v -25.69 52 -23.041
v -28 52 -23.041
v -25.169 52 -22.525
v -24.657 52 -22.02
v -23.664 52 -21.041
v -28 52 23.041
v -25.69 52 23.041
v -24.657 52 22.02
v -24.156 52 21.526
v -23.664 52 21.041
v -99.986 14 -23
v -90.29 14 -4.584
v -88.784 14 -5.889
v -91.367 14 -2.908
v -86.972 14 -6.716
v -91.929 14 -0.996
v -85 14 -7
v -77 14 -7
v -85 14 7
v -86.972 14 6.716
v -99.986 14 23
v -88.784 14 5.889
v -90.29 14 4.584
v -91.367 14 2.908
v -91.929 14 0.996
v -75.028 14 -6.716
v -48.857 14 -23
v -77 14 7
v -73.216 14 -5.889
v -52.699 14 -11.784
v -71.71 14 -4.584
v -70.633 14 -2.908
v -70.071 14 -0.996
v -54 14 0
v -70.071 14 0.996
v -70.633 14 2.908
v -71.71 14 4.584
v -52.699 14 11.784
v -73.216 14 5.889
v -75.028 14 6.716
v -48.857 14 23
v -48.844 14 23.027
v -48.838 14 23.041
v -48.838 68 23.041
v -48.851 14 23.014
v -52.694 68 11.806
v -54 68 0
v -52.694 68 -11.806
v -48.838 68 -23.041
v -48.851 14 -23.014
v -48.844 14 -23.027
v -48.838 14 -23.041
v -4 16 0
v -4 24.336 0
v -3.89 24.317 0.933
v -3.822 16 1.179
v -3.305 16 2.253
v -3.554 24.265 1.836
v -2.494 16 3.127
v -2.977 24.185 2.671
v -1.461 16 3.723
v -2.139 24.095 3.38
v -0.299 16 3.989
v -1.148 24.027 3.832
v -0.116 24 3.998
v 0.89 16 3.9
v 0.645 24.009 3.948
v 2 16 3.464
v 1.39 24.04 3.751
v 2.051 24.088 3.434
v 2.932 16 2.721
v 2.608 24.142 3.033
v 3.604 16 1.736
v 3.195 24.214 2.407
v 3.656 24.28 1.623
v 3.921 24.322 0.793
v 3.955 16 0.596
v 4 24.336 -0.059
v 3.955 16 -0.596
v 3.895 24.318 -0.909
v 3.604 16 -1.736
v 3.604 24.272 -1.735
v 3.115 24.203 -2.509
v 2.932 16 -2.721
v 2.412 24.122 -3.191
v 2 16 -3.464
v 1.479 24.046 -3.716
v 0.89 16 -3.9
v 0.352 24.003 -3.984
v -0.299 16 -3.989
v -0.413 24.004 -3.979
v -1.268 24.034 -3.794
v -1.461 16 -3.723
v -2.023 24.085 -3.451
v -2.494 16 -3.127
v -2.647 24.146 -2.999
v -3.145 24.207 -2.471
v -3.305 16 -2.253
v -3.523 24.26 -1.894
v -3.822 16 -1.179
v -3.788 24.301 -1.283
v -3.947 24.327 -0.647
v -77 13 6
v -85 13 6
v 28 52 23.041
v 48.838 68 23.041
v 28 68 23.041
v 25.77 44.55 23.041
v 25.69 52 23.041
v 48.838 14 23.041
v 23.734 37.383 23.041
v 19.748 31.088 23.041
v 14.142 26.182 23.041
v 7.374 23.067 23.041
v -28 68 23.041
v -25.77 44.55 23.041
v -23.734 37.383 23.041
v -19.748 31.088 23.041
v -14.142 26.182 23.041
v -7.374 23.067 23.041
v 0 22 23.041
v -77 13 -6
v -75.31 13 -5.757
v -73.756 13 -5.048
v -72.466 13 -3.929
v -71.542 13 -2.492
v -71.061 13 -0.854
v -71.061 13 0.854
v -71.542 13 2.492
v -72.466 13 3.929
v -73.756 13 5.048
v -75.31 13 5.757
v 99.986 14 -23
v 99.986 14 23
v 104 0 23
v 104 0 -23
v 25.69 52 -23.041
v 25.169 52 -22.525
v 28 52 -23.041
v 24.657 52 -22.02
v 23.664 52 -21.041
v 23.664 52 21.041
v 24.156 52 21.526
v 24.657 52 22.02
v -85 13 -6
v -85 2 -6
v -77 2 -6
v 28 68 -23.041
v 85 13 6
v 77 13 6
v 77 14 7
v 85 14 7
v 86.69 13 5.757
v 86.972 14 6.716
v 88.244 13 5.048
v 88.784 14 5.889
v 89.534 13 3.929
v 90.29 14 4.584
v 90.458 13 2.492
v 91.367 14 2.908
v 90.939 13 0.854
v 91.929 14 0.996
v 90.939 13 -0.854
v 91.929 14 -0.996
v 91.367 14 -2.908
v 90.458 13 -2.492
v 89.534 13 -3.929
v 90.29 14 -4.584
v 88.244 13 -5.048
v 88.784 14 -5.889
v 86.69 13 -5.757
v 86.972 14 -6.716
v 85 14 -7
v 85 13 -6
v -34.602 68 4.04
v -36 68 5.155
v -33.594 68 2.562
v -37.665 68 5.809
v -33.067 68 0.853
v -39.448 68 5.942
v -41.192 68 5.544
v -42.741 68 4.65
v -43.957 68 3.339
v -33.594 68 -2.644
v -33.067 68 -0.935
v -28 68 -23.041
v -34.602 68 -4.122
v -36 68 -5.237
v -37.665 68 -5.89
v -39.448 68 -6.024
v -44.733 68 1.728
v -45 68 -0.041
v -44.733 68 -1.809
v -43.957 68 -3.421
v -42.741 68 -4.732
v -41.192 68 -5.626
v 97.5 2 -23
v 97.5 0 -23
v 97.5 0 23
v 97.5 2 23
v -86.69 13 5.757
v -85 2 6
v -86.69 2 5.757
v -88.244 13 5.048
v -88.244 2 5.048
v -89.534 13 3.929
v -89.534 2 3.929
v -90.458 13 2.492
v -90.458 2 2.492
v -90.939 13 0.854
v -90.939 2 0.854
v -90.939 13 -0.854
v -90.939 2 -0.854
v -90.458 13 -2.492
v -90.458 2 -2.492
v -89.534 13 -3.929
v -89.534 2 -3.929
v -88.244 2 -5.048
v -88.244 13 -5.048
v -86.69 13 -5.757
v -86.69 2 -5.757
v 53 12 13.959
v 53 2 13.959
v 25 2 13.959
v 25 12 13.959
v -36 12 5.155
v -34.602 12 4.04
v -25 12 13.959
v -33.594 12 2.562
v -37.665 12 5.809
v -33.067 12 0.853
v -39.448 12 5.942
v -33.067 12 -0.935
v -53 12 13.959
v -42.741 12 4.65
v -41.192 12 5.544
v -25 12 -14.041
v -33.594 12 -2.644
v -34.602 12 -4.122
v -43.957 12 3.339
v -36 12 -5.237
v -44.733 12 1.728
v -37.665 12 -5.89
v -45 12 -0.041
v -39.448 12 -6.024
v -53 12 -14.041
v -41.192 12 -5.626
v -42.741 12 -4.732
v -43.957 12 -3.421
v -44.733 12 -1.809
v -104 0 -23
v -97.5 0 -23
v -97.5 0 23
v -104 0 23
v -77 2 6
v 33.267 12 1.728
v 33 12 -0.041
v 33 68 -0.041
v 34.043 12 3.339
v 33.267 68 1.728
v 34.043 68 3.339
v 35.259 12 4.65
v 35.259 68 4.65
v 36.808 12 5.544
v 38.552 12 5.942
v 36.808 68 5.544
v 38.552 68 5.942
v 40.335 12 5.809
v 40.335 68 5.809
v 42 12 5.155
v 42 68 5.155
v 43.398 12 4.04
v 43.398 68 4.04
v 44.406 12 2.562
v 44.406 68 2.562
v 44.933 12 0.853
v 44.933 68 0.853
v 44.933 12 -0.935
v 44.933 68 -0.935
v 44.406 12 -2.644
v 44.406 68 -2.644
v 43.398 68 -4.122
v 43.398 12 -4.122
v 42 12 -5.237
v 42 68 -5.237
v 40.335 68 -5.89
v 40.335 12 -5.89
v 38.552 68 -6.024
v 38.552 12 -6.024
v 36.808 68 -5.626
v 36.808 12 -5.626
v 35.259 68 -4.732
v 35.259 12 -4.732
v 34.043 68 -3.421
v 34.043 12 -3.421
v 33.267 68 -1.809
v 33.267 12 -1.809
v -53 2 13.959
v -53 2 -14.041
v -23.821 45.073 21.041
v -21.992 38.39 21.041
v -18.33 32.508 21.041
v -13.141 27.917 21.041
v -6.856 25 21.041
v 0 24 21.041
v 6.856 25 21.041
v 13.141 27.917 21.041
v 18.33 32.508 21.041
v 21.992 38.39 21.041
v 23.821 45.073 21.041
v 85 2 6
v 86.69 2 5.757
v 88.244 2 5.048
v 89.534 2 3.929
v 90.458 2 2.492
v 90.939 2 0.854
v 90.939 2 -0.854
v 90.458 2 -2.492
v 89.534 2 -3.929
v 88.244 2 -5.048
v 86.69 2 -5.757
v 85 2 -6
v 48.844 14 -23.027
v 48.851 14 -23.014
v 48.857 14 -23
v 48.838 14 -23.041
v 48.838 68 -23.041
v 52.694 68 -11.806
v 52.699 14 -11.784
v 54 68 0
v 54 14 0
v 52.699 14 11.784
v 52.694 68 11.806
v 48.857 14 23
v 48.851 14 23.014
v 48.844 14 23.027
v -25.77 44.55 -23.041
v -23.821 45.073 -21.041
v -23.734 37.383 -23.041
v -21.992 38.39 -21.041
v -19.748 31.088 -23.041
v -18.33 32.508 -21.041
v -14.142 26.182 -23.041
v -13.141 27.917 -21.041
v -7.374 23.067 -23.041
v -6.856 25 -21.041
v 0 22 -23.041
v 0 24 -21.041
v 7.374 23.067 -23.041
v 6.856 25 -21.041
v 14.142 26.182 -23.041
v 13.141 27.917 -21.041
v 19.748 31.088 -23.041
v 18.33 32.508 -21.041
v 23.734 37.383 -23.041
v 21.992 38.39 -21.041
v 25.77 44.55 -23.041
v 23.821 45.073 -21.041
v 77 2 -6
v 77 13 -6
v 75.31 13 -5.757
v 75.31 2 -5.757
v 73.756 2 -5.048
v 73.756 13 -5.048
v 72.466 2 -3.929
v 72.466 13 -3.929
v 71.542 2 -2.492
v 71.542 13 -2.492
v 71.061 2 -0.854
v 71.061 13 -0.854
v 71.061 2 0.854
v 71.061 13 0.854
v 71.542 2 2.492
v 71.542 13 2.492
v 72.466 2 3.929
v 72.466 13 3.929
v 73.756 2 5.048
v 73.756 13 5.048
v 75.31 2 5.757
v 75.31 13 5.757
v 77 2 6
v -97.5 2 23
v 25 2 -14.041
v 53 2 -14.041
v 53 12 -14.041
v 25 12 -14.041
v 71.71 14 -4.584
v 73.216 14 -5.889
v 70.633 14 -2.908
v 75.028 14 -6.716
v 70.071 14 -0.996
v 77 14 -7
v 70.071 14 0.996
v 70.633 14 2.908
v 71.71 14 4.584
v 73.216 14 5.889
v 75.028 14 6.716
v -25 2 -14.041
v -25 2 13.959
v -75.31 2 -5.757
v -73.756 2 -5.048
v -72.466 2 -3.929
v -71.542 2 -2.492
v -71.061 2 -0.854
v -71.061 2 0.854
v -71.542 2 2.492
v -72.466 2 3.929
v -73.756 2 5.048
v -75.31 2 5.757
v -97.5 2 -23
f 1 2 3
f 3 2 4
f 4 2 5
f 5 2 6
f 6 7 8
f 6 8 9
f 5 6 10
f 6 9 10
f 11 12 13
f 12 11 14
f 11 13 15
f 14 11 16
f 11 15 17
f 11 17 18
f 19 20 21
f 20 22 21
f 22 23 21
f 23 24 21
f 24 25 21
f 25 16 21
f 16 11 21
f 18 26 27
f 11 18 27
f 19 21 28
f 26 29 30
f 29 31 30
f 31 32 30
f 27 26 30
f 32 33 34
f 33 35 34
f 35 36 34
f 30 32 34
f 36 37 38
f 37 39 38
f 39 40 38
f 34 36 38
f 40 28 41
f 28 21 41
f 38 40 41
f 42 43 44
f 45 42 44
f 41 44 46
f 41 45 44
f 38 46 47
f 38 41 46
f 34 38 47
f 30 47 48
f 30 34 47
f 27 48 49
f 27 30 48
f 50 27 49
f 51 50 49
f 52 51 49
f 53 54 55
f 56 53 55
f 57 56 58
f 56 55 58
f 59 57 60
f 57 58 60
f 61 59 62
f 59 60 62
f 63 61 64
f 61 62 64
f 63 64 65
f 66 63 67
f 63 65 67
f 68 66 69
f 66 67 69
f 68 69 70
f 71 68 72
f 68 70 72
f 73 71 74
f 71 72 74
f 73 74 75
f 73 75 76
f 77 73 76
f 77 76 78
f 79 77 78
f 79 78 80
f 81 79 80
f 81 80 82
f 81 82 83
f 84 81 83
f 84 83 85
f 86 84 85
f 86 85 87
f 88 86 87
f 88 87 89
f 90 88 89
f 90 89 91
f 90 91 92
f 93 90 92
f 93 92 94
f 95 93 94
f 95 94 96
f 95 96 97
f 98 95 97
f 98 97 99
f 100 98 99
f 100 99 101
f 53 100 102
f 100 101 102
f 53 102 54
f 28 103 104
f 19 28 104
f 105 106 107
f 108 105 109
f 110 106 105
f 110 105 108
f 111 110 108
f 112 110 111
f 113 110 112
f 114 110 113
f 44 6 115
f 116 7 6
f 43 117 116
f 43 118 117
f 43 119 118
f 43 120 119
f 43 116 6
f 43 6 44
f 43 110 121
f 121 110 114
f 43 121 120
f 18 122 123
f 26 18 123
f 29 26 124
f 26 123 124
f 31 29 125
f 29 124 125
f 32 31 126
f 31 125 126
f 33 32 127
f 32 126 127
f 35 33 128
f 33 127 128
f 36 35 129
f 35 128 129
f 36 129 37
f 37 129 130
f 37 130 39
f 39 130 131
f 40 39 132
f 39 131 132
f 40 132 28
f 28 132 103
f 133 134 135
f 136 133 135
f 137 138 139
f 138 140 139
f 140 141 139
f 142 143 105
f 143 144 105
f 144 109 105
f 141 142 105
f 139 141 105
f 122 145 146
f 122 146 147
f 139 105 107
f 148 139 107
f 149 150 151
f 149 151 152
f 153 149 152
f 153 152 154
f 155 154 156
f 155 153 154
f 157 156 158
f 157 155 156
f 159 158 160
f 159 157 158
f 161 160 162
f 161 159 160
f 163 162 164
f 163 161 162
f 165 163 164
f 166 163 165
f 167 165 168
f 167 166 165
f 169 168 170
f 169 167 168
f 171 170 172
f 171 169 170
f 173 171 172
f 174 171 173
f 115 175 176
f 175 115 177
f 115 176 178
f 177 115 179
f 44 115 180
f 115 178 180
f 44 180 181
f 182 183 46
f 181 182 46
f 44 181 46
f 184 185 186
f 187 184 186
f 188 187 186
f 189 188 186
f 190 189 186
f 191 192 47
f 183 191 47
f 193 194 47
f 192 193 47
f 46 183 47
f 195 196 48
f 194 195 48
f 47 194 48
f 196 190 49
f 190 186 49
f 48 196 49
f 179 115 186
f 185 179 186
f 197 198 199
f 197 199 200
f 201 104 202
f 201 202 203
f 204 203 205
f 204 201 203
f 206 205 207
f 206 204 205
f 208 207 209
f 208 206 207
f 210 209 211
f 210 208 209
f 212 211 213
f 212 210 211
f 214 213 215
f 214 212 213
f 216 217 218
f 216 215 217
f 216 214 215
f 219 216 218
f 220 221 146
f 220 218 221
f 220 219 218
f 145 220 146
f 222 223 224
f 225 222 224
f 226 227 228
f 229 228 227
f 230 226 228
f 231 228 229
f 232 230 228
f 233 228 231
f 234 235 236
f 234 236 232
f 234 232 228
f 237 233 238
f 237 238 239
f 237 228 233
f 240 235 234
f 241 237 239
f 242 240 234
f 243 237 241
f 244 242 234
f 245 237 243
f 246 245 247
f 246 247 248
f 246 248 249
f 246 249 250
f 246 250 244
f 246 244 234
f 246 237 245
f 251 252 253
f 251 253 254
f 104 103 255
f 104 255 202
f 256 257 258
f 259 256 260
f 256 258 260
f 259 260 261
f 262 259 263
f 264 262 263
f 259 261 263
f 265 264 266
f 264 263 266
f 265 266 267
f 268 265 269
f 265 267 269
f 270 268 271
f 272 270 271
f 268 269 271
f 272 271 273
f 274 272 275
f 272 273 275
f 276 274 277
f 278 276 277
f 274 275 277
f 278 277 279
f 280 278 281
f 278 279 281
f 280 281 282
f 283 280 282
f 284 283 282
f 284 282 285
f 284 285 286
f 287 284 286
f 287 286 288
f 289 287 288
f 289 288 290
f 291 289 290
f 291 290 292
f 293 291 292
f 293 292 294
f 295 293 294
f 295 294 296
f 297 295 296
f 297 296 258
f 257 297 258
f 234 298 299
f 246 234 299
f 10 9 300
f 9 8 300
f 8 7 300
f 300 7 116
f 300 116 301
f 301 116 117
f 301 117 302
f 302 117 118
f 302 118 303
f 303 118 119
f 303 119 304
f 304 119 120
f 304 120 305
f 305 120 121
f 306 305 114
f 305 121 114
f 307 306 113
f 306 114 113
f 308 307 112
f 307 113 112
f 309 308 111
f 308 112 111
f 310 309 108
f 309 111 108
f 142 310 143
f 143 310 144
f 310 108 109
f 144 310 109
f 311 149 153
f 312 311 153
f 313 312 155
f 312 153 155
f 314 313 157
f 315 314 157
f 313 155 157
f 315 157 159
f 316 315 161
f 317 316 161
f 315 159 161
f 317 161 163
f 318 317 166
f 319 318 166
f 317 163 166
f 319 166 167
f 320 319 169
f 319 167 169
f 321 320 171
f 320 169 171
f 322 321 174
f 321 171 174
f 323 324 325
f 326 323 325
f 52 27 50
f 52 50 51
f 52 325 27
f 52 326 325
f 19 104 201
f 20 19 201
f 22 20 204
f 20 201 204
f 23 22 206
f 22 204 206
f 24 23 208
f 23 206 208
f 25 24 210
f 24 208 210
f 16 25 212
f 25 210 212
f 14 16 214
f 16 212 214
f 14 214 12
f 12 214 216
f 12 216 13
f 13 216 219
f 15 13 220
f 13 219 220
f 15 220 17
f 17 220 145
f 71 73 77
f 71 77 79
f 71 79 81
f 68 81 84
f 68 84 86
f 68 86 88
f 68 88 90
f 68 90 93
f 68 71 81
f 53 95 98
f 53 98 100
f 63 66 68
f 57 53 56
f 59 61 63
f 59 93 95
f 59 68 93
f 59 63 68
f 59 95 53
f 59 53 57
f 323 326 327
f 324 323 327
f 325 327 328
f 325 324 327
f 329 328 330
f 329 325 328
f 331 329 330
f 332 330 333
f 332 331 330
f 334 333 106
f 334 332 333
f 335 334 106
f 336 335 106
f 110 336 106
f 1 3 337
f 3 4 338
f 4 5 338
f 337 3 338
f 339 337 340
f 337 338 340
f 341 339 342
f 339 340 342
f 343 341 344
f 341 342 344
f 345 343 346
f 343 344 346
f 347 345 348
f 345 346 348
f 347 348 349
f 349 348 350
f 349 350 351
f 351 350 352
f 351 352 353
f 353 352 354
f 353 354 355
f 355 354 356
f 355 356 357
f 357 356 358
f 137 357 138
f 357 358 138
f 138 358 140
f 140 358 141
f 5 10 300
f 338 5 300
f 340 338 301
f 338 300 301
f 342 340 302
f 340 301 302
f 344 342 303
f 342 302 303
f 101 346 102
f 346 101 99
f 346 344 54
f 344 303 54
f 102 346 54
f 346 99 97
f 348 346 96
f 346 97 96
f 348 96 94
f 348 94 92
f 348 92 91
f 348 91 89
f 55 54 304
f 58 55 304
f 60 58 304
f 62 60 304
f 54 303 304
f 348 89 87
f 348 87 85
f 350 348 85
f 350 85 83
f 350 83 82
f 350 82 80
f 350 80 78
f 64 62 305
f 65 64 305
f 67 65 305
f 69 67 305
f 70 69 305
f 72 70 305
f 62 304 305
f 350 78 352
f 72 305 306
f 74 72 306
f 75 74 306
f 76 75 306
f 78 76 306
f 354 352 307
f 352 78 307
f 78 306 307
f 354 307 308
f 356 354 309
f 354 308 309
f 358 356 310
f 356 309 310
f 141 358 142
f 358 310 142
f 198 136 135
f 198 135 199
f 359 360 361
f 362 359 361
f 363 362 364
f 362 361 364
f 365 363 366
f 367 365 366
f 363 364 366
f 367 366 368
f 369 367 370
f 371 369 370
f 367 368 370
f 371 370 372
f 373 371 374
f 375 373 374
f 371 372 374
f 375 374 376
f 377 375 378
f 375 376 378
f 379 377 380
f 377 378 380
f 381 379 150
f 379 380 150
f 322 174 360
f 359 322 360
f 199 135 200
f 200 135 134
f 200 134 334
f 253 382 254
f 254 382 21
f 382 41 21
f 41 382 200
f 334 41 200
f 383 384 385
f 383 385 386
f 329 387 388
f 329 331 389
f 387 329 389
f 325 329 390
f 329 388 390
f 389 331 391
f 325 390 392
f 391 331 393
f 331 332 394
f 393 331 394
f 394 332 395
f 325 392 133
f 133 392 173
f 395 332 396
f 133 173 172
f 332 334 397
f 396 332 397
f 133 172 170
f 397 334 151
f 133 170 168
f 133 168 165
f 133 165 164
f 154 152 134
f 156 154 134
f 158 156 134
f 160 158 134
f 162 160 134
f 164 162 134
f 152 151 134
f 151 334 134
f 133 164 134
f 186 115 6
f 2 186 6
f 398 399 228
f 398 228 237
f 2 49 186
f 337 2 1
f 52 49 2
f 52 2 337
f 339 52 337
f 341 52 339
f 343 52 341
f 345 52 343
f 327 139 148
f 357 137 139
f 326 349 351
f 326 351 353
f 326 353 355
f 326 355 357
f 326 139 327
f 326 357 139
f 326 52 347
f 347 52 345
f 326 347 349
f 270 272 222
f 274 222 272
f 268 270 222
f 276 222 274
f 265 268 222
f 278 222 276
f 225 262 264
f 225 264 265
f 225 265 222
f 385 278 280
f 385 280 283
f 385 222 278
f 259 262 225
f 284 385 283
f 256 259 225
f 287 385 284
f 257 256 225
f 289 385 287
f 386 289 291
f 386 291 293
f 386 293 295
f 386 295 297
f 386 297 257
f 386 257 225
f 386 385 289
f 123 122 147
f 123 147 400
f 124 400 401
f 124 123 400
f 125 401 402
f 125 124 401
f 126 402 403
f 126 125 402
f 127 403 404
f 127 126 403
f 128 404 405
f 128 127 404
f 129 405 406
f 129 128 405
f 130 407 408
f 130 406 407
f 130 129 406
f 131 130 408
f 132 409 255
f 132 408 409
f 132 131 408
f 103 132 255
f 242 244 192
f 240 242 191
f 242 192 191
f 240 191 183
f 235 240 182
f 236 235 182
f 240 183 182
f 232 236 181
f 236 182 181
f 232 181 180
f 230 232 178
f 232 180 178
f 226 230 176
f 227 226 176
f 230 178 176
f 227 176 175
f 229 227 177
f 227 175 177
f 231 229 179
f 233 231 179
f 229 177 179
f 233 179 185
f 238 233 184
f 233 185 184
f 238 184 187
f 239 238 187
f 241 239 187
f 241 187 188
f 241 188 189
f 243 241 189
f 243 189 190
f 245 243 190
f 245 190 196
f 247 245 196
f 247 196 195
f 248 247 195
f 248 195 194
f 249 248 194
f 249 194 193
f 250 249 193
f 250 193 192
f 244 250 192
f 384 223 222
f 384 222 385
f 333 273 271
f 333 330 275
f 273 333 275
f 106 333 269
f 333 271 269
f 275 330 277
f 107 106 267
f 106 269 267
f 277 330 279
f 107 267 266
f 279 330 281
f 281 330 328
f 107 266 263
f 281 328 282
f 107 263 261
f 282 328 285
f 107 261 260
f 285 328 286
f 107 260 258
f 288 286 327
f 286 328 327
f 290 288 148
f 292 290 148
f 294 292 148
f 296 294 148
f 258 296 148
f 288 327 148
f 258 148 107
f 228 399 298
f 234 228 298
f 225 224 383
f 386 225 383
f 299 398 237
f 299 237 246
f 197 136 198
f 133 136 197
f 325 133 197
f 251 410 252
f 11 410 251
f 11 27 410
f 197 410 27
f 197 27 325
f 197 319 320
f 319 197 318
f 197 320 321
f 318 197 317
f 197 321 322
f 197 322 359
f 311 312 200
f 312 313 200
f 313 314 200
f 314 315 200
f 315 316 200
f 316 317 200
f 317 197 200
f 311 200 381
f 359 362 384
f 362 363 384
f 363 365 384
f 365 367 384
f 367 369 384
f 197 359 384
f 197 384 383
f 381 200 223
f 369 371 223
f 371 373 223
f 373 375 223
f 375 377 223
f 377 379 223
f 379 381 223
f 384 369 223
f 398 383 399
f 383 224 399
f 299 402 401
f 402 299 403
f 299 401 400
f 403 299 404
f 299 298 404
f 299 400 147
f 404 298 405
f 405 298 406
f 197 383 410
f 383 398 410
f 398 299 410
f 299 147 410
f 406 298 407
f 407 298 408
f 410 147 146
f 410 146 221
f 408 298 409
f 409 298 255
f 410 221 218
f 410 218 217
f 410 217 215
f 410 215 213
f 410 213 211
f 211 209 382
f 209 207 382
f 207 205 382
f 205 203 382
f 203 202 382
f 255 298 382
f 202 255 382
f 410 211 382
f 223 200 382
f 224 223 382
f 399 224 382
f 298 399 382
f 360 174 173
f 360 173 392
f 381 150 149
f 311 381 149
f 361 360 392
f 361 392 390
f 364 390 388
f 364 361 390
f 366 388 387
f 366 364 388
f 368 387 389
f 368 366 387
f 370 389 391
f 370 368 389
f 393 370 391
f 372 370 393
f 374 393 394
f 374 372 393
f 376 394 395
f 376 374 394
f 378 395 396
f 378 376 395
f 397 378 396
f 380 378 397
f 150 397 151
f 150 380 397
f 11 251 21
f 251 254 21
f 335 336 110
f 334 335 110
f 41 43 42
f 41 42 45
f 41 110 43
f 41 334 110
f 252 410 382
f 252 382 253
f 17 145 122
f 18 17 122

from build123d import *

# Parameters (mm, degrees)
BOSS_EXTRUDE1_DEPTH = 23
BOSS_EXTRUDE2_DEPTH = 54
SKETCH5_R           = 4
CUT_EXTRUDE1_DEPTH  = 52
CUT_EXTRUDE5_DEPTH  = 133.527415876
SKETCH8_R           = 6
CUT_EXTRUDE6_DEPTH  = 127.3759431
CUT_EXTRUDE7_DEPTH  = 120.427295851
SKETCH10_W          = 28
SKETCH10_H          = 28
CUT_EXTRUDE8_DEPTH  = 10
CHAMFER1_SIZE       = 2
CHAMFER2_SIZE       = 1


with BuildPart() as part:
    # Sketch1 → Boss-Extrude1 (new, symmetric)
    with BuildSketch(Plane.XY):
        Polygon((104, 0), (97.5, 0), (97.5, 2), (-97.5, 2), (-97.5, 0), (-104, 0), (-99.985564599, 14), (99.985564599, 14), align=None)
    extrude(amount=BOSS_EXTRUDE1_DEPTH, both=True)

    # Sketch3 → Boss-Extrude2 (add)
    with BuildSketch(Plane(origin=(0, 14, 0), x_dir=(1, 0, 0), z_dir=(0, 1, 0))):
        with BuildLine():
            Line((-48.837700706, 23.040811394), (48.837700706, 23.040811394))
            ThreePointArc((48.837700706, 23.040811394), (54, 0), (48.837700706, -23.040811394))
            Line((48.837700706, -23.040811394), (-48.837700706, -23.040811394))
            ThreePointArc((-48.837700706, -23.040811394), (-54, 0), (-48.837700706, 23.040811394))
        make_face()
    extrude(amount=BOSS_EXTRUDE2_DEPTH)

    # Sketch5 → Cut-Extrude1 (cut)
    with BuildSketch(Plane(origin=(0, 68, 0), x_dir=(1, 0, 0), z_dir=(0, 1, 0))):
        with Locations(Location((0, 0, 0), (0, 0, 180))):
            Circle(SKETCH5_R)
    extrude(amount=-CUT_EXTRUDE1_DEPTH, mode=Mode.SUBTRACT)

    # Sketch6 → Cut-Extrude5 (cut, through all)
    with BuildSketch(Plane.XY.offset(23.040811394)):
        with BuildLine():
            Line((-28, 374.971379092), (-28, 68))
            Line((-28, 68), (-28, 52))
            Line((-28, 52), (-23.664319132, 52))
            ThreePointArc((-23.664319132, 52), (0, 24), (23.664319132, 52))
            Line((23.664319132, 52), (28, 52))
            Line((28, 52), (28, 68))
            Line((28, 68), (28, 374.971379092))
            Line((28, 374.971379092), (28, 988.914137277))
            Line((28, 988.914137277), (-28, 988.914137277))
            Line((-28, 988.914137277), (-28, 374.971379092))
        make_face()
    extrude(amount=-CUT_EXTRUDE5_DEPTH, mode=Mode.SUBTRACT)

    # Sketch8 → Cut-Extrude6 (cut, through all)
    with BuildSketch(Plane(origin=(0, 68, 0), x_dir=(1, 0, 0), z_dir=(0, 1, 0))):
        with Locations(Location((-39, 0.040811394, 0), (0, 0, 180))):
            Circle(SKETCH8_R)
        with Locations(Location((39, 0.040811394, 0), (0, 0, 180))):
            Circle(SKETCH8_R)
    extrude(amount=-CUT_EXTRUDE6_DEPTH, mode=Mode.SUBTRACT)

    # Sketch9 → Cut-Extrude7 (cut, through all)
    with BuildSketch(Plane(origin=(0, 14, 0), x_dir=(1, 0, 0), z_dir=(0, 1, 0))):
        with BuildLine():
            Line((-85, 6), (-77, 6))
            ThreePointArc((-77, 6), (-71, 0), (-77, -6))
            Line((-77, -6), (-85, -6))
            ThreePointArc((-85, -6), (-91, 0), (-85, 6))
        make_face()
        with BuildLine():
            Line((85, 6), (77, 6))
            ThreePointArc((77, 6), (71, 0), (77, -6))
            Line((77, -6), (85, -6))
            ThreePointArc((85, -6), (91, 0), (85, 6))
        make_face()
    extrude(amount=-CUT_EXTRUDE7_DEPTH, mode=Mode.SUBTRACT)

    # Sketch10 → Cut-Extrude8 (cut)
    with BuildSketch(Plane(origin=(0, 2, 0), x_dir=(-1, 0, 0), z_dir=(0, -1, 0))):
        with Locations((39, 0.040811394)):
            Rectangle(SKETCH10_W, SKETCH10_H)
        with Locations((-39, 0.040811394)):
            Rectangle(SKETCH10_W, SKETCH10_H)
    extrude(amount=-CUT_EXTRUDE8_DEPTH, mode=Mode.SUBTRACT)

    # Chamfer1
    chamfer1_edges = [part.edges().sort_by_distance(p)[0] for p in [
        (0, 24, -23.040811394),
        (0, 24, 23.040811394),
    ]]
    chamfer(chamfer1_edges, length=CHAMFER1_SIZE)

    # Chamfer2
    chamfer2_edges = [part.edges().sort_by_distance(p)[0] for p in [
        (91, 14, 0),
        (81, 14, -6),
        (71, 14, 0),
        (81, 14, 6),
        (-91, 14, 0),
        (-81, 14, 6),
        (-71, 14, 0),
        (-81, 14, -6),
    ]]
    chamfer(chamfer2_edges, length=CHAMFER2_SIZE)


solid = part.part
